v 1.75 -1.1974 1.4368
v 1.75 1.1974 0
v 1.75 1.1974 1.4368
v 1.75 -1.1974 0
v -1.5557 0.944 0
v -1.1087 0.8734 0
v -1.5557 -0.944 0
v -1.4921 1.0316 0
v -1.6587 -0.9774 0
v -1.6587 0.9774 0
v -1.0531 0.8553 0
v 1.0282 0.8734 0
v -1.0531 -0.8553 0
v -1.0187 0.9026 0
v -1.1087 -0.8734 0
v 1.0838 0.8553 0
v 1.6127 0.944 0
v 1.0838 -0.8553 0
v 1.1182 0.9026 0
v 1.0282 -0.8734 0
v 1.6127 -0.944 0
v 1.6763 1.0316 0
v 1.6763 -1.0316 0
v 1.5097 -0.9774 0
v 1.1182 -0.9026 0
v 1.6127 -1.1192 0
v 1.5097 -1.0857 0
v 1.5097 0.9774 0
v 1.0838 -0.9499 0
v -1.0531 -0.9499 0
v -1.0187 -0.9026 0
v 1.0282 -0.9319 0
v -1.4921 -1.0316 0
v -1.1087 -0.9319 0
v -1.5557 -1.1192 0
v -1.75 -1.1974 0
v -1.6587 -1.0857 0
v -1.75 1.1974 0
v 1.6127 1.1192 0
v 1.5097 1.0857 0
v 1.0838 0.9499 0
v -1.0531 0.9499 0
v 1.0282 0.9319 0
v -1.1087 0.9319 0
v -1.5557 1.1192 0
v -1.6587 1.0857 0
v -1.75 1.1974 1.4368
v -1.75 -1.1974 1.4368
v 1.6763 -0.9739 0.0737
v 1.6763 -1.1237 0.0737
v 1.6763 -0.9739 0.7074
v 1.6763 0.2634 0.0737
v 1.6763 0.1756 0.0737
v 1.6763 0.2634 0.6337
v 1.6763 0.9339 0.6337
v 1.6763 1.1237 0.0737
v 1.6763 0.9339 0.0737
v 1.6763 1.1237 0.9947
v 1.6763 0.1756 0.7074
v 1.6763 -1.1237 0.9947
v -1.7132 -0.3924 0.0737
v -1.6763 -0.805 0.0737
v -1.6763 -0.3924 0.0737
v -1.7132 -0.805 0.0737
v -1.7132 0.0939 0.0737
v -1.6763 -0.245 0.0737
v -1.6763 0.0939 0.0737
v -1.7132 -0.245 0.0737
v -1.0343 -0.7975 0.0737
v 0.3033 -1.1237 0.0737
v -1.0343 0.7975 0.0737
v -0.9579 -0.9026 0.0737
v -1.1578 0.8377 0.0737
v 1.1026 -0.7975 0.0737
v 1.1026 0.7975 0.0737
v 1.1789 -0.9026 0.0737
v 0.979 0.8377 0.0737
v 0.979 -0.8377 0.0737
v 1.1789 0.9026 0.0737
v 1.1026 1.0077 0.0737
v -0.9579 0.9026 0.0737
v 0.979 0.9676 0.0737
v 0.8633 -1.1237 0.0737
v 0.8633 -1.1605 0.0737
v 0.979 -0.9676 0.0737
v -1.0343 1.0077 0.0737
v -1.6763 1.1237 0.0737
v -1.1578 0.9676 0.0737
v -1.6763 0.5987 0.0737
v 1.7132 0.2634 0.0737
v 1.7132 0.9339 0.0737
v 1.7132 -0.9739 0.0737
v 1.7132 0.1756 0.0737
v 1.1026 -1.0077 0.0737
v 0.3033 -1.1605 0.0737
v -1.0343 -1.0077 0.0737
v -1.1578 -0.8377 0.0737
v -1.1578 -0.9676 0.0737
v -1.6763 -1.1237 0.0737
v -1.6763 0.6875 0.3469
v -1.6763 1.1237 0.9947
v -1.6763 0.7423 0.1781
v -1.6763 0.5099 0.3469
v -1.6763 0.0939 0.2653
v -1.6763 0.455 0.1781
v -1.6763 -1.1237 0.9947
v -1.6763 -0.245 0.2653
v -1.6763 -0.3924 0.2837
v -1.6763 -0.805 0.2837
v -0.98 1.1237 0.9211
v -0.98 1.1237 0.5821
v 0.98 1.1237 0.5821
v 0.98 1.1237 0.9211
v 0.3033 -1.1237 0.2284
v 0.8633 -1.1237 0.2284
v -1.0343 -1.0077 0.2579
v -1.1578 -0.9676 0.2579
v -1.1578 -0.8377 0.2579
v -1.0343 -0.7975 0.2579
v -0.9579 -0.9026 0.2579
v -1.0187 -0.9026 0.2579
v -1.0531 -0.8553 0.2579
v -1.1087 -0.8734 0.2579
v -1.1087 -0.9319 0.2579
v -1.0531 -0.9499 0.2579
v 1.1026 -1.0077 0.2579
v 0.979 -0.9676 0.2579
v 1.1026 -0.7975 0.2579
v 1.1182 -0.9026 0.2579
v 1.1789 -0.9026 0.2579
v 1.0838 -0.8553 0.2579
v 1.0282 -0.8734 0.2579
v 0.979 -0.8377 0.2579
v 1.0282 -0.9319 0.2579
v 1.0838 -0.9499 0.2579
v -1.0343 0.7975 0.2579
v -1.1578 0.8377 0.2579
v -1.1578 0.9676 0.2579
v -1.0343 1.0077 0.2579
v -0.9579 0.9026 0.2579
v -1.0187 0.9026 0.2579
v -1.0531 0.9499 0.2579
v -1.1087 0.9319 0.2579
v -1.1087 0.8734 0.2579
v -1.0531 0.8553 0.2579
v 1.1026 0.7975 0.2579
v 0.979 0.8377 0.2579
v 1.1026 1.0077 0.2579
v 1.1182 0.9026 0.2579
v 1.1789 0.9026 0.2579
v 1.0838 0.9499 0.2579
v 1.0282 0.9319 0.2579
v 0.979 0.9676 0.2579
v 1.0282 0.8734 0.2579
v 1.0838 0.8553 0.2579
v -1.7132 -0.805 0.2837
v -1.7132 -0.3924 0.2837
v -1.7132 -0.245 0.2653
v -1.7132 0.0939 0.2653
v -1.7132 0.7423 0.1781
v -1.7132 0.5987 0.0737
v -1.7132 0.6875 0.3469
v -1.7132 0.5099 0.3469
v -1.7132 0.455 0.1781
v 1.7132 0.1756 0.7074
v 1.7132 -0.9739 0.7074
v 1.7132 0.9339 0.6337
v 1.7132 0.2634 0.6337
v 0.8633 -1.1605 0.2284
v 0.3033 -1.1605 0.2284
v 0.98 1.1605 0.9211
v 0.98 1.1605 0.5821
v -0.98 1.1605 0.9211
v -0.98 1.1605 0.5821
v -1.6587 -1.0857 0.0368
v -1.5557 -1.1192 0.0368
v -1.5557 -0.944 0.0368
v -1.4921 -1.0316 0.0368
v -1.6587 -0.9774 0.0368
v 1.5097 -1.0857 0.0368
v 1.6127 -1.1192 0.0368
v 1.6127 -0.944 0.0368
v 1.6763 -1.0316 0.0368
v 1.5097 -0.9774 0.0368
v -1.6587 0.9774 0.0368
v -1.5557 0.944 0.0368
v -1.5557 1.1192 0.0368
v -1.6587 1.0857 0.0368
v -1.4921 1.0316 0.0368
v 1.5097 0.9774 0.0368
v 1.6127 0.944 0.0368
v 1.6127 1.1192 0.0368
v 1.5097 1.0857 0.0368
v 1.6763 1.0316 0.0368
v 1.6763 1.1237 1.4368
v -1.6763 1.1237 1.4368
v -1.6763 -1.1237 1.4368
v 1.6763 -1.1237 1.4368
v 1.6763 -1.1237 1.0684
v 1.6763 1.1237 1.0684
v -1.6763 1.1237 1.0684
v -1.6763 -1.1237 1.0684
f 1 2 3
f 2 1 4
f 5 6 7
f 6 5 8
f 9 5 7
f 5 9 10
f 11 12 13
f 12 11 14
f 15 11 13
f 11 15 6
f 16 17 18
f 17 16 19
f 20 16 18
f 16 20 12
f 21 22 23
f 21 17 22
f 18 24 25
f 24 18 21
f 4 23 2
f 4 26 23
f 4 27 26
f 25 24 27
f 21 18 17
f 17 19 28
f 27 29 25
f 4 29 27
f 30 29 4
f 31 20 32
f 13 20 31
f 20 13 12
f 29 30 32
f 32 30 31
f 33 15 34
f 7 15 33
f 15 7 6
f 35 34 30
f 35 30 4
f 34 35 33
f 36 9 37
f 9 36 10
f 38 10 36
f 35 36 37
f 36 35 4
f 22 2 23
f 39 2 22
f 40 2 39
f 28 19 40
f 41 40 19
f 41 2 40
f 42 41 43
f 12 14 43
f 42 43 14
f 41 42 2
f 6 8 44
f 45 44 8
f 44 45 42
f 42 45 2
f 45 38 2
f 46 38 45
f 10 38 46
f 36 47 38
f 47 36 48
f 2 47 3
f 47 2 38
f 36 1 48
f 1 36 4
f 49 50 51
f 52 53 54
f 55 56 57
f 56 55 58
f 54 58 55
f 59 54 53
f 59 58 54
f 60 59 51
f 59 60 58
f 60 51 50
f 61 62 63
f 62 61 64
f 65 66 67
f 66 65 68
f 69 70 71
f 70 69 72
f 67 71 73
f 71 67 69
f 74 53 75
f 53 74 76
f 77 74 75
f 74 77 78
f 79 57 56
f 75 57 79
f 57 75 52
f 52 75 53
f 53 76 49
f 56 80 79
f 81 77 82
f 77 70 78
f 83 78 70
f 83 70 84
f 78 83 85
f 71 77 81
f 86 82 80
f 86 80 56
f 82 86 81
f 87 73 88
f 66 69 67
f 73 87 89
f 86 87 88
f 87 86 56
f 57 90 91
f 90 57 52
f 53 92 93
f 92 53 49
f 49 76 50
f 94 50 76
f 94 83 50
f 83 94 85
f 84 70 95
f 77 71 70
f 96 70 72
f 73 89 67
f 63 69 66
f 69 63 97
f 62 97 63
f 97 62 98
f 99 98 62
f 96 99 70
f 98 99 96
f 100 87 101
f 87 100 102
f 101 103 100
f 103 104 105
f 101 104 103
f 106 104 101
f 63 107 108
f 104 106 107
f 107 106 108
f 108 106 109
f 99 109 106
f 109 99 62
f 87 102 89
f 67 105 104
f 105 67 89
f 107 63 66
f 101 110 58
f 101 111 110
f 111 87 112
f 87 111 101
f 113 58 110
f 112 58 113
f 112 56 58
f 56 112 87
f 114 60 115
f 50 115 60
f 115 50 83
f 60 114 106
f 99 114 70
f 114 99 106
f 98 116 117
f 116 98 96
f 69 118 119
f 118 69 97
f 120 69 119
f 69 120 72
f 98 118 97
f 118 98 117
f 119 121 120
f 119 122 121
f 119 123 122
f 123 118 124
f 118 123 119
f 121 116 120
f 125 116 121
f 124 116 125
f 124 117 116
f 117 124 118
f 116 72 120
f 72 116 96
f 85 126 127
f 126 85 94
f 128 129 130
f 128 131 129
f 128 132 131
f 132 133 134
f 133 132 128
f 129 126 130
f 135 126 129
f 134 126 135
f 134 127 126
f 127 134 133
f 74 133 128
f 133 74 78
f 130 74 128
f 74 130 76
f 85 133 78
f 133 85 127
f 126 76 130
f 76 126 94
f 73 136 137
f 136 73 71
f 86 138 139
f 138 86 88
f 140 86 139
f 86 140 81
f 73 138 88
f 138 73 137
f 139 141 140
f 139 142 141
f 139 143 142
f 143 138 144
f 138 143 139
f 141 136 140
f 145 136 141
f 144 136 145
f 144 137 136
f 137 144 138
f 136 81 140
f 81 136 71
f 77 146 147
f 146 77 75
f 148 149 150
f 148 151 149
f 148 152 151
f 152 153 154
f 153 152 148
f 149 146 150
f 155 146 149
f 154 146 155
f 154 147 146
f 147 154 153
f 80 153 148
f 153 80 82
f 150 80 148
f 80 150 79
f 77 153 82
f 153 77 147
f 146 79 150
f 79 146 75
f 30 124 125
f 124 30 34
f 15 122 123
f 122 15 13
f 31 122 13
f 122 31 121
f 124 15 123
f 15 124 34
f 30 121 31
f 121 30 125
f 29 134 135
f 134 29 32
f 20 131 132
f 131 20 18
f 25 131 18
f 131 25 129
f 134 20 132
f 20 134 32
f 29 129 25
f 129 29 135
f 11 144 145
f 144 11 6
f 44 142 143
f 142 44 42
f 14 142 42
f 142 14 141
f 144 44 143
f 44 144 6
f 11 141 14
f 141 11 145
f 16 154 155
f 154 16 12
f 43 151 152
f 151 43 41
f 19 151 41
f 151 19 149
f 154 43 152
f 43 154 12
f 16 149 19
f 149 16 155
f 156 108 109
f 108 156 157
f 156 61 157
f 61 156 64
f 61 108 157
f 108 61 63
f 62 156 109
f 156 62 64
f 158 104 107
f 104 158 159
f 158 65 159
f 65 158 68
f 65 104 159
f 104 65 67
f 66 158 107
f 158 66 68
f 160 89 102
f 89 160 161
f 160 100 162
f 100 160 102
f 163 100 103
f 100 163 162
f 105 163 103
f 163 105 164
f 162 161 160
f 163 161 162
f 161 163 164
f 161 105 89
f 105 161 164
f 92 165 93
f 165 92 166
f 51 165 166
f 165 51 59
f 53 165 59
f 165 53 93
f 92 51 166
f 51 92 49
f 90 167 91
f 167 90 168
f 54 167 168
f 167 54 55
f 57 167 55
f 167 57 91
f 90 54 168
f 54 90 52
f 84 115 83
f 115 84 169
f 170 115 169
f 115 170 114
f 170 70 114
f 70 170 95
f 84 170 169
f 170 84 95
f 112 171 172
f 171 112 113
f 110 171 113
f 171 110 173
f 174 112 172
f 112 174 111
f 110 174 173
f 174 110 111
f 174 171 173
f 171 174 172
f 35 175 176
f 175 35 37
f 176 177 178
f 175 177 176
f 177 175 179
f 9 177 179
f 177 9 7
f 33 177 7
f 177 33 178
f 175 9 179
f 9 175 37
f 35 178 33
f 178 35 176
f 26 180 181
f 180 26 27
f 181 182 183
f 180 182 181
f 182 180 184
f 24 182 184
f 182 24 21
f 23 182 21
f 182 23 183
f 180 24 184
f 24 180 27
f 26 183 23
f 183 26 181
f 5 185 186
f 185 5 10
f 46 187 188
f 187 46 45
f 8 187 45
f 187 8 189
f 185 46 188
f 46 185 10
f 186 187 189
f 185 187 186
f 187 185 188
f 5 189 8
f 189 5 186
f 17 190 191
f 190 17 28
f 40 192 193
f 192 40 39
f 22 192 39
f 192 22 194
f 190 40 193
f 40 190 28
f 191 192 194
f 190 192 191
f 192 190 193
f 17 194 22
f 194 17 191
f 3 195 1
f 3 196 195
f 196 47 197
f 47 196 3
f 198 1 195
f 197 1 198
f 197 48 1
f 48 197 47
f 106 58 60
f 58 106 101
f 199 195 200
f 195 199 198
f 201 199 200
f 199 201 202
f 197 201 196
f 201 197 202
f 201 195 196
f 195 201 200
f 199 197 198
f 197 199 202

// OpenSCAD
// Parameters
total_length = 3.5; //[1.75:7:0.1]
scale = 0.0368421053; //[0.0184210526:0.0736842106:0.0001]
wall_t = 0.0736842106; //[0.0368421053:0.1473684212:0.01]
base_outer_L = 3.5; //[1.75:7:0.1]
base_outer_W = 2.3947368421; //[1.1973684211:4.7894736842:0.1]
base_outer_H = 1.0315789474; //[0.5157894737:2.0631578948:0.05]
lid_outer_H = 0.4421052632; //[0.2210526316:0.8842105264:0.05]
internal_clearance_Z = 0.2210526316; //[0.1105263158:0.4421052632:0.02]
pcb_L = 3.1315789474; //[1.5657894737:6.2631578948:0.1]
pcb_W = 2.0631578948; //[1.0315789474:4.1263157896:0.1]
pcb_t = 0.0589473684; //[0.0294736842:0.1178947368:0.005]
standoff_h = 0.2210526316; //[0.1105263158:0.4421052632:0.02]
standoff_od = 0.2210526316; //[0.1105263158:0.4421052632:0.02]
standoff_hole_d = 0.0994736842; //[0.0497368421:0.1989473684:0.01]
mount_hole_pitch_X = 2.1368421053; //[1.0684210526:4.2736842106:0.05]
mount_hole_pitch_Y = 1.8052631579; //[0.9026315789:3.6105263158:0.05]
mount_hole_edge_offset_X = 0.1289473684; //[0.0644736842:0.2578947368:0.01]
mount_hole_edge_offset_Y = 0.1289473684; //[0.0644736842:0.2578947368:0.01]
gpio_slot_L = 1.9157894737; //[0.9578947368:3.8315789474:0.05]
gpio_slot_H = 0.2947368421; //[0.1473684211:0.5894736842:0.02]
gpio_slot_edge_clearance = 0.0736842106; //[0.0368421053:0.1473684212:0.01]
cutout_clearance = 0.0221052632; //[0.0110526316:0.0442105264:0.005]
usb_c_cutout_W = 0.3684210526; //[0.1842105263:0.7368421052:0.02]
usb_c_cutout_H = 0.1657894737; //[0.0828947368:0.3315789474:0.02]
micro_hdmi_cutout_W = 0.2947368421; //[0.1473684211:0.5894736842:0.02]
micro_hdmi_cutout_H = 0.1473684211; //[0.0736842106:0.2947368422:0.02]
av_cutout_D = 0.2578947368; //[0.1289473684:0.5157894736:0.02]
av_cutout_H = 0.2578947368; //[0.1289473684:0.5157894736:0.02]
usb_stack_cutout_W = 1.1052631579; //[0.5526315789:2.2105263158:0.05]
usb_stack_cutout_H = 0.5894736842; //[0.2947368421:1.1789473684:0.05]
eth_cutout_W = 0.6263157895; //[0.3131578947:1.252631579:0.05]
eth_cutout_H = 0.5157894737; //[0.2578947368:1.0315789474:0.05]
microsd_slot_W = 0.5157894737; //[0.2578947368:1.0315789474:0.05]
microsd_slot_H = 0.1105263158; //[0.0552631579:0.2210526316:0.01]
vent_slot_W = 0.0921052632; //[0.0460526316:0.1842105264:0.01]
vent_slot_L = 0.7368421053; //[0.3684210526:1.4736842106:0.05]
vent_slot_pitch = 0.1842105263; //[0.0921052632:0.3684210526:0.02]
lip_depth = 0.0552631579; //[0.0276315789:0.1105263158:0.005]
lip_height = 0.1105263158; //[0.0552631579:0.2210526316:0.01]
overlap = 0.0368421053; //[0.0184210526:0.0736842106:0.005]
port_cutout_depth = 0.1842105263; //[0.0921052632:0.3684210526:0.02]
pcb_cavity_clearance_xy = 0.0736842106; //[0.0368421053:0.1473684212:0.01]
feet_recess_d = 0.1842105263; //[0.0921052632:0.3684210526:0.02]
feet_recess_h = 0.0368421053; //[0.0184210526:0.0736842106:0.005]
snap_w = 0.1105263158; //[0.0552631579:0.2210526316:0.01]
snap_t = 0.0368421053; //[0.0184210526:0.0736842106:0.005]
snap_h = 0.1105263158; //[0.0552631579:0.2210526316:0.01]

// Base Outer
module base_outer() {
  translate([0, 0, base_outer_H/2])
    cube([base_outer_L, base_outer_W, base_outer_H], center=true);
}

// Base Inner Cavity
module base_inner_cavity() {
  translate([0, 0, wall_t + (base_outer_H-wall_t)/2])
    cube([base_outer_L-2*wall_t, base_outer_W-2*wall_t, base_outer_H-wall_t], center=true);
}

// PCB Cavity
module pcb_cavity() {
  translate([0, 0, wall_t + (standoff_h+pcb_t+internal_clearance_Z)/2])
    cube([pcb_L+2*pcb_cavity_clearance_xy, pcb_W+2*pcb_cavity_clearance_xy, standoff_h+pcb_t+internal_clearance_Z], center=true);
}

// Standoff Cylinder
module standoff_cyl() {
  translate([0, 0, wall_t + standoff_h/2 - overlap])
    cylinder(r=standoff_od/2, h=standoff_h, center=true);
}

// Standoff Hole
module standoff_hole() {
  translate([0, 0, wall_t + standoff_h/2 - overlap])
    cylinder(r=standoff_hole_d/2, h=standoff_h + 2*overlap, center=true);
}

// Lid Outer
module lid_outer() {
  translate([0, 0, base_outer_H + lid_outer_H/2 - overlap])
    cube([base_outer_L, base_outer_W, lid_outer_H], center=true);
}

// Lid Inner Cavity
module lid_inner_cavity() {
  translate([0, 0, base_outer_H + wall_t + (lid_outer_H-wall_t)/2 - overlap])
    cube([base_outer_L-2*wall_t, base_outer_W-2*wall_t, lid_outer_H-wall_t], center=true);
}

// Lip Ring Outer
module lip_ring_outer() {
  translate([0, 0, base_outer_H - lip_height/2 + overlap])
    cube([base_outer_L-2*wall_t+2*lip_depth, base_outer_W-2*wall_t+2*lip_depth, lip_height], center=true);
}

// Lip Ring Inner
module lip_ring_inner() {
  translate([0, 0, base_outer_H - lip_height/2 + overlap])
    cube([base_outer_L-2*wall_t, base_outer_W-2*wall_t, lip_height + 2*overlap], center=true);
}

// USB-C Cutout
module usb_c_cutout() {
  translate([-base_outer_L/2 + port_cutout_depth/2 + overlap, -base_outer_W/4, wall_t + (usb_c_cutout_H + 2*cutout_clearance)/2])
    cube([port_cutout_depth, usb_c_cutout_W + 2*cutout_clearance, usb_c_cutout_H + 2*cutout_clearance], center=true);
}

// Micro HDMI Cutout
module micro_hdmi_cutout() {
  translate([-base_outer_L/2 + port_cutout_depth/2 + overlap, -base_outer_W/4 + (micro_hdmi_cutout_W + 2*cutout_clearance + vent_slot_pitch), wall_t + (micro_hdmi_cutout_H + 2*cutout_clearance)/2])
    cube([port_cutout_depth, micro_hdmi_cutout_W + 2*cutout_clearance, micro_hdmi_cutout_H + 2*cutout_clearance], center=true);
}

// AV Cutout
module av_cutout() {
  translate([-base_outer_L/2 + port_cutout_depth/2 + overlap, base_outer_W/4, wall_t + (av_cutout_H + 2*cutout_clearance)/2])
    rotate([0, 90, 0])
    cylinder(r=(av_cutout_D + 2*cutout_clearance)/2, h=port_cutout_depth, center=true);
}

// USB Stack Cutout
module usb_stack_cutout() {
  translate([base_outer_L/2 - port_cutout_depth/2 - overlap, -base_outer_W/6, wall_t + (usb_stack_cutout_H + 2*cutout_clearance)/2])
    cube([port_cutout_depth, usb_stack_cutout_W + 2*cutout_clearance, usb_stack_cutout_H + 2*cutout_clearance], center=true);
}

// Ethernet Cutout
module eth_cutout() {
  translate([base_outer_L/2 - port_cutout_depth/2 - overlap, base_outer_W/4, wall_t + (eth_cutout_H + 2*cutout_clearance)/2])
    cube([port_cutout_depth, eth_cutout_W + 2*cutout_clearance, eth_cutout_H + 2*cutout_clearance], center=true);
}

// MicroSD Cutout
module microsd_cutout() {
  translate([base_outer_L/6, -base_outer_W/2 + port_cutout_depth/2 + overlap, wall_t + (microsd_slot_H + 2*cutout_clearance)/2])
    cube([microsd_slot_W + 2*cutout_clearance, port_cutout_depth, microsd_slot_H + 2*cutout_clearance], center=true);
}

// GPIO Slot
module gpio_slot() {
  translate([0, base_outer_W/2 - port_cutout_depth/2 - overlap, base_outer_H - lip_height - (gpio_slot_H + 2*cutout_clearance)/2])
    cube([gpio_slot_L + 2*cutout_clearance, port_cutout_depth, gpio_slot_H + 2*cutout_clearance], center=true);
}

// Vent Slot Top
module vent_slot_top() {
  translate([0, 0, base_outer_H + lid_outer_H - wall_t/2])
    cube([vent_slot_L, vent_slot_W, wall_t + 2*overlap], center=true);
}

// Vent Slot Side
module vent_slot_side() {
  translate([0, base_outer_W/2 - port_cutout_depth/2 - overlap, base_outer_H/2])
    cube([vent_slot_L, port_cutout_depth, vent_slot_W], center=true);
}

// Feet Recess
module feet_recess() {
  translate([0, 0, feet_recess_h/2])
    cylinder(r=feet_recess_d/2, h=feet_recess_h, center=true);
}

// Snap Tab
module snap_tab() {
  translate([base_outer_L/2 - wall_t/2, 0, base_outer_H - snap_h/2])
    cube([snap_t, snap_w, snap_h], center=true);
}

// Base Shell
module base_shell() {
  difference() {
    base_outer();
    base_inner_cavity();
  }
}

// Base with Standoffs
module base_with_standoffs() {
  union() {
    base_shell();
    translate([-mount_hole_pitch_X/2, -mount_hole_pitch_Y/2, 0]) standoff_cyl();
    translate([mount_hole_pitch_X/2, -mount_hole_pitch_Y/2, 0]) standoff_cyl();
    translate([-mount_hole_pitch_X/2, mount_hole_pitch_Y/2, 0]) standoff_cyl();
    translate([mount_hole_pitch_X/2, mount_hole_pitch_Y/2, 0]) standoff_cyl();
  }
}

// Base with Standoffs Drilled
module base_with_standoffs_drilled() {
  difference() {
    base_with_standoffs();
    translate([-mount_hole_pitch_X/2, -mount_hole_pitch_Y/2, 0]) standoff_hole();
    translate([mount_hole_pitch_X/2, -mount_hole_pitch_Y/2, 0]) standoff_hole();
    translate([-mount_hole_pitch_X/2, mount_hole_pitch_Y/2, 0]) standoff_hole();
    translate([mount_hole_pitch_X/2, mount_hole_pitch_Y/2, 0]) standoff_hole();
  }
}

// Base with Ports
module base_with_ports() {
  difference() {
    base_with_standoffs_drilled();
    usb_c_cutout();
    micro_hdmi_cutout();
    av_cutout();
    usb_stack_cutout();
    eth_cutout();
    microsd_cutout();
    gpio_slot();
  }
}

// Base with Feet Recesses
module base_with_feet_recesses() {
  difference() {
    base_with_ports();
    translate([-(base_outer_L/2 - feet_recess_d/2 - wall_t), -(base_outer_W/2 - feet_recess_d/2 - wall_t), 0]) feet_recess();
    translate([(base_outer_L/2 - feet_recess_d/2 - wall_t), -(base_outer_W/2 - feet_recess_d/2 - wall_t), 0]) feet_recess();
    translate([-(base_outer_L/2 - feet_recess_d/2 - wall_t), (base_outer_W/2 - feet_recess_d/2 - wall_t), 0]) feet_recess();
    translate([(base_outer_L/2 - feet_recess_d/2 - wall_t), (base_outer_W/2 - feet_recess_d/2 - wall_t), 0]) feet_recess();
  }
}

// Lip Ring
module lip_ring() {
  difference() {
    lip_ring_outer();
    lip_ring_inner();
  }
}

// Base Complete
module base_complete() {
  union() {
    base_with_feet_recesses();
    lip_ring();
  }
}

// Lid Shell
module lid_shell() {
  difference() {
    lid_outer();
    lid_inner_cavity();
  }
}

// Lid with Top Vents
module lid_with_top_vents() {
  difference() {
    lid_shell();
    union() {
      translate([-vent_slot_pitch, 0, 0]) vent_slot_top();
      translate([0, 0, 0]) vent_slot_top();
      translate([vent_slot_pitch, 0, 0]) vent_slot_top();
    }
  }
}

// Lid Complete
module lid_complete() {
  difference() {
    lid_with_top_vents();
    union() {
      translate([-vent_slot_pitch, 0, 0]) vent_slot_side();
      translate([0, 0, 0]) vent_slot_side();
      translate([vent_slot_pitch, 0, 0]) vent_slot_side();
    }
  }
}

// Base with Snaps
module base_with_snaps() {
  union() {
    base_complete();
    translate([0, -base_outer_W/4, 0]) snap_tab();
    translate([0, base_outer_W/4, 0]) snap_tab();
  }
}

// Case Complete
module case_complete() {
  union() {
    base_with_snaps();
    lid_complete();
  }
}

// Final Output
case_complete();
